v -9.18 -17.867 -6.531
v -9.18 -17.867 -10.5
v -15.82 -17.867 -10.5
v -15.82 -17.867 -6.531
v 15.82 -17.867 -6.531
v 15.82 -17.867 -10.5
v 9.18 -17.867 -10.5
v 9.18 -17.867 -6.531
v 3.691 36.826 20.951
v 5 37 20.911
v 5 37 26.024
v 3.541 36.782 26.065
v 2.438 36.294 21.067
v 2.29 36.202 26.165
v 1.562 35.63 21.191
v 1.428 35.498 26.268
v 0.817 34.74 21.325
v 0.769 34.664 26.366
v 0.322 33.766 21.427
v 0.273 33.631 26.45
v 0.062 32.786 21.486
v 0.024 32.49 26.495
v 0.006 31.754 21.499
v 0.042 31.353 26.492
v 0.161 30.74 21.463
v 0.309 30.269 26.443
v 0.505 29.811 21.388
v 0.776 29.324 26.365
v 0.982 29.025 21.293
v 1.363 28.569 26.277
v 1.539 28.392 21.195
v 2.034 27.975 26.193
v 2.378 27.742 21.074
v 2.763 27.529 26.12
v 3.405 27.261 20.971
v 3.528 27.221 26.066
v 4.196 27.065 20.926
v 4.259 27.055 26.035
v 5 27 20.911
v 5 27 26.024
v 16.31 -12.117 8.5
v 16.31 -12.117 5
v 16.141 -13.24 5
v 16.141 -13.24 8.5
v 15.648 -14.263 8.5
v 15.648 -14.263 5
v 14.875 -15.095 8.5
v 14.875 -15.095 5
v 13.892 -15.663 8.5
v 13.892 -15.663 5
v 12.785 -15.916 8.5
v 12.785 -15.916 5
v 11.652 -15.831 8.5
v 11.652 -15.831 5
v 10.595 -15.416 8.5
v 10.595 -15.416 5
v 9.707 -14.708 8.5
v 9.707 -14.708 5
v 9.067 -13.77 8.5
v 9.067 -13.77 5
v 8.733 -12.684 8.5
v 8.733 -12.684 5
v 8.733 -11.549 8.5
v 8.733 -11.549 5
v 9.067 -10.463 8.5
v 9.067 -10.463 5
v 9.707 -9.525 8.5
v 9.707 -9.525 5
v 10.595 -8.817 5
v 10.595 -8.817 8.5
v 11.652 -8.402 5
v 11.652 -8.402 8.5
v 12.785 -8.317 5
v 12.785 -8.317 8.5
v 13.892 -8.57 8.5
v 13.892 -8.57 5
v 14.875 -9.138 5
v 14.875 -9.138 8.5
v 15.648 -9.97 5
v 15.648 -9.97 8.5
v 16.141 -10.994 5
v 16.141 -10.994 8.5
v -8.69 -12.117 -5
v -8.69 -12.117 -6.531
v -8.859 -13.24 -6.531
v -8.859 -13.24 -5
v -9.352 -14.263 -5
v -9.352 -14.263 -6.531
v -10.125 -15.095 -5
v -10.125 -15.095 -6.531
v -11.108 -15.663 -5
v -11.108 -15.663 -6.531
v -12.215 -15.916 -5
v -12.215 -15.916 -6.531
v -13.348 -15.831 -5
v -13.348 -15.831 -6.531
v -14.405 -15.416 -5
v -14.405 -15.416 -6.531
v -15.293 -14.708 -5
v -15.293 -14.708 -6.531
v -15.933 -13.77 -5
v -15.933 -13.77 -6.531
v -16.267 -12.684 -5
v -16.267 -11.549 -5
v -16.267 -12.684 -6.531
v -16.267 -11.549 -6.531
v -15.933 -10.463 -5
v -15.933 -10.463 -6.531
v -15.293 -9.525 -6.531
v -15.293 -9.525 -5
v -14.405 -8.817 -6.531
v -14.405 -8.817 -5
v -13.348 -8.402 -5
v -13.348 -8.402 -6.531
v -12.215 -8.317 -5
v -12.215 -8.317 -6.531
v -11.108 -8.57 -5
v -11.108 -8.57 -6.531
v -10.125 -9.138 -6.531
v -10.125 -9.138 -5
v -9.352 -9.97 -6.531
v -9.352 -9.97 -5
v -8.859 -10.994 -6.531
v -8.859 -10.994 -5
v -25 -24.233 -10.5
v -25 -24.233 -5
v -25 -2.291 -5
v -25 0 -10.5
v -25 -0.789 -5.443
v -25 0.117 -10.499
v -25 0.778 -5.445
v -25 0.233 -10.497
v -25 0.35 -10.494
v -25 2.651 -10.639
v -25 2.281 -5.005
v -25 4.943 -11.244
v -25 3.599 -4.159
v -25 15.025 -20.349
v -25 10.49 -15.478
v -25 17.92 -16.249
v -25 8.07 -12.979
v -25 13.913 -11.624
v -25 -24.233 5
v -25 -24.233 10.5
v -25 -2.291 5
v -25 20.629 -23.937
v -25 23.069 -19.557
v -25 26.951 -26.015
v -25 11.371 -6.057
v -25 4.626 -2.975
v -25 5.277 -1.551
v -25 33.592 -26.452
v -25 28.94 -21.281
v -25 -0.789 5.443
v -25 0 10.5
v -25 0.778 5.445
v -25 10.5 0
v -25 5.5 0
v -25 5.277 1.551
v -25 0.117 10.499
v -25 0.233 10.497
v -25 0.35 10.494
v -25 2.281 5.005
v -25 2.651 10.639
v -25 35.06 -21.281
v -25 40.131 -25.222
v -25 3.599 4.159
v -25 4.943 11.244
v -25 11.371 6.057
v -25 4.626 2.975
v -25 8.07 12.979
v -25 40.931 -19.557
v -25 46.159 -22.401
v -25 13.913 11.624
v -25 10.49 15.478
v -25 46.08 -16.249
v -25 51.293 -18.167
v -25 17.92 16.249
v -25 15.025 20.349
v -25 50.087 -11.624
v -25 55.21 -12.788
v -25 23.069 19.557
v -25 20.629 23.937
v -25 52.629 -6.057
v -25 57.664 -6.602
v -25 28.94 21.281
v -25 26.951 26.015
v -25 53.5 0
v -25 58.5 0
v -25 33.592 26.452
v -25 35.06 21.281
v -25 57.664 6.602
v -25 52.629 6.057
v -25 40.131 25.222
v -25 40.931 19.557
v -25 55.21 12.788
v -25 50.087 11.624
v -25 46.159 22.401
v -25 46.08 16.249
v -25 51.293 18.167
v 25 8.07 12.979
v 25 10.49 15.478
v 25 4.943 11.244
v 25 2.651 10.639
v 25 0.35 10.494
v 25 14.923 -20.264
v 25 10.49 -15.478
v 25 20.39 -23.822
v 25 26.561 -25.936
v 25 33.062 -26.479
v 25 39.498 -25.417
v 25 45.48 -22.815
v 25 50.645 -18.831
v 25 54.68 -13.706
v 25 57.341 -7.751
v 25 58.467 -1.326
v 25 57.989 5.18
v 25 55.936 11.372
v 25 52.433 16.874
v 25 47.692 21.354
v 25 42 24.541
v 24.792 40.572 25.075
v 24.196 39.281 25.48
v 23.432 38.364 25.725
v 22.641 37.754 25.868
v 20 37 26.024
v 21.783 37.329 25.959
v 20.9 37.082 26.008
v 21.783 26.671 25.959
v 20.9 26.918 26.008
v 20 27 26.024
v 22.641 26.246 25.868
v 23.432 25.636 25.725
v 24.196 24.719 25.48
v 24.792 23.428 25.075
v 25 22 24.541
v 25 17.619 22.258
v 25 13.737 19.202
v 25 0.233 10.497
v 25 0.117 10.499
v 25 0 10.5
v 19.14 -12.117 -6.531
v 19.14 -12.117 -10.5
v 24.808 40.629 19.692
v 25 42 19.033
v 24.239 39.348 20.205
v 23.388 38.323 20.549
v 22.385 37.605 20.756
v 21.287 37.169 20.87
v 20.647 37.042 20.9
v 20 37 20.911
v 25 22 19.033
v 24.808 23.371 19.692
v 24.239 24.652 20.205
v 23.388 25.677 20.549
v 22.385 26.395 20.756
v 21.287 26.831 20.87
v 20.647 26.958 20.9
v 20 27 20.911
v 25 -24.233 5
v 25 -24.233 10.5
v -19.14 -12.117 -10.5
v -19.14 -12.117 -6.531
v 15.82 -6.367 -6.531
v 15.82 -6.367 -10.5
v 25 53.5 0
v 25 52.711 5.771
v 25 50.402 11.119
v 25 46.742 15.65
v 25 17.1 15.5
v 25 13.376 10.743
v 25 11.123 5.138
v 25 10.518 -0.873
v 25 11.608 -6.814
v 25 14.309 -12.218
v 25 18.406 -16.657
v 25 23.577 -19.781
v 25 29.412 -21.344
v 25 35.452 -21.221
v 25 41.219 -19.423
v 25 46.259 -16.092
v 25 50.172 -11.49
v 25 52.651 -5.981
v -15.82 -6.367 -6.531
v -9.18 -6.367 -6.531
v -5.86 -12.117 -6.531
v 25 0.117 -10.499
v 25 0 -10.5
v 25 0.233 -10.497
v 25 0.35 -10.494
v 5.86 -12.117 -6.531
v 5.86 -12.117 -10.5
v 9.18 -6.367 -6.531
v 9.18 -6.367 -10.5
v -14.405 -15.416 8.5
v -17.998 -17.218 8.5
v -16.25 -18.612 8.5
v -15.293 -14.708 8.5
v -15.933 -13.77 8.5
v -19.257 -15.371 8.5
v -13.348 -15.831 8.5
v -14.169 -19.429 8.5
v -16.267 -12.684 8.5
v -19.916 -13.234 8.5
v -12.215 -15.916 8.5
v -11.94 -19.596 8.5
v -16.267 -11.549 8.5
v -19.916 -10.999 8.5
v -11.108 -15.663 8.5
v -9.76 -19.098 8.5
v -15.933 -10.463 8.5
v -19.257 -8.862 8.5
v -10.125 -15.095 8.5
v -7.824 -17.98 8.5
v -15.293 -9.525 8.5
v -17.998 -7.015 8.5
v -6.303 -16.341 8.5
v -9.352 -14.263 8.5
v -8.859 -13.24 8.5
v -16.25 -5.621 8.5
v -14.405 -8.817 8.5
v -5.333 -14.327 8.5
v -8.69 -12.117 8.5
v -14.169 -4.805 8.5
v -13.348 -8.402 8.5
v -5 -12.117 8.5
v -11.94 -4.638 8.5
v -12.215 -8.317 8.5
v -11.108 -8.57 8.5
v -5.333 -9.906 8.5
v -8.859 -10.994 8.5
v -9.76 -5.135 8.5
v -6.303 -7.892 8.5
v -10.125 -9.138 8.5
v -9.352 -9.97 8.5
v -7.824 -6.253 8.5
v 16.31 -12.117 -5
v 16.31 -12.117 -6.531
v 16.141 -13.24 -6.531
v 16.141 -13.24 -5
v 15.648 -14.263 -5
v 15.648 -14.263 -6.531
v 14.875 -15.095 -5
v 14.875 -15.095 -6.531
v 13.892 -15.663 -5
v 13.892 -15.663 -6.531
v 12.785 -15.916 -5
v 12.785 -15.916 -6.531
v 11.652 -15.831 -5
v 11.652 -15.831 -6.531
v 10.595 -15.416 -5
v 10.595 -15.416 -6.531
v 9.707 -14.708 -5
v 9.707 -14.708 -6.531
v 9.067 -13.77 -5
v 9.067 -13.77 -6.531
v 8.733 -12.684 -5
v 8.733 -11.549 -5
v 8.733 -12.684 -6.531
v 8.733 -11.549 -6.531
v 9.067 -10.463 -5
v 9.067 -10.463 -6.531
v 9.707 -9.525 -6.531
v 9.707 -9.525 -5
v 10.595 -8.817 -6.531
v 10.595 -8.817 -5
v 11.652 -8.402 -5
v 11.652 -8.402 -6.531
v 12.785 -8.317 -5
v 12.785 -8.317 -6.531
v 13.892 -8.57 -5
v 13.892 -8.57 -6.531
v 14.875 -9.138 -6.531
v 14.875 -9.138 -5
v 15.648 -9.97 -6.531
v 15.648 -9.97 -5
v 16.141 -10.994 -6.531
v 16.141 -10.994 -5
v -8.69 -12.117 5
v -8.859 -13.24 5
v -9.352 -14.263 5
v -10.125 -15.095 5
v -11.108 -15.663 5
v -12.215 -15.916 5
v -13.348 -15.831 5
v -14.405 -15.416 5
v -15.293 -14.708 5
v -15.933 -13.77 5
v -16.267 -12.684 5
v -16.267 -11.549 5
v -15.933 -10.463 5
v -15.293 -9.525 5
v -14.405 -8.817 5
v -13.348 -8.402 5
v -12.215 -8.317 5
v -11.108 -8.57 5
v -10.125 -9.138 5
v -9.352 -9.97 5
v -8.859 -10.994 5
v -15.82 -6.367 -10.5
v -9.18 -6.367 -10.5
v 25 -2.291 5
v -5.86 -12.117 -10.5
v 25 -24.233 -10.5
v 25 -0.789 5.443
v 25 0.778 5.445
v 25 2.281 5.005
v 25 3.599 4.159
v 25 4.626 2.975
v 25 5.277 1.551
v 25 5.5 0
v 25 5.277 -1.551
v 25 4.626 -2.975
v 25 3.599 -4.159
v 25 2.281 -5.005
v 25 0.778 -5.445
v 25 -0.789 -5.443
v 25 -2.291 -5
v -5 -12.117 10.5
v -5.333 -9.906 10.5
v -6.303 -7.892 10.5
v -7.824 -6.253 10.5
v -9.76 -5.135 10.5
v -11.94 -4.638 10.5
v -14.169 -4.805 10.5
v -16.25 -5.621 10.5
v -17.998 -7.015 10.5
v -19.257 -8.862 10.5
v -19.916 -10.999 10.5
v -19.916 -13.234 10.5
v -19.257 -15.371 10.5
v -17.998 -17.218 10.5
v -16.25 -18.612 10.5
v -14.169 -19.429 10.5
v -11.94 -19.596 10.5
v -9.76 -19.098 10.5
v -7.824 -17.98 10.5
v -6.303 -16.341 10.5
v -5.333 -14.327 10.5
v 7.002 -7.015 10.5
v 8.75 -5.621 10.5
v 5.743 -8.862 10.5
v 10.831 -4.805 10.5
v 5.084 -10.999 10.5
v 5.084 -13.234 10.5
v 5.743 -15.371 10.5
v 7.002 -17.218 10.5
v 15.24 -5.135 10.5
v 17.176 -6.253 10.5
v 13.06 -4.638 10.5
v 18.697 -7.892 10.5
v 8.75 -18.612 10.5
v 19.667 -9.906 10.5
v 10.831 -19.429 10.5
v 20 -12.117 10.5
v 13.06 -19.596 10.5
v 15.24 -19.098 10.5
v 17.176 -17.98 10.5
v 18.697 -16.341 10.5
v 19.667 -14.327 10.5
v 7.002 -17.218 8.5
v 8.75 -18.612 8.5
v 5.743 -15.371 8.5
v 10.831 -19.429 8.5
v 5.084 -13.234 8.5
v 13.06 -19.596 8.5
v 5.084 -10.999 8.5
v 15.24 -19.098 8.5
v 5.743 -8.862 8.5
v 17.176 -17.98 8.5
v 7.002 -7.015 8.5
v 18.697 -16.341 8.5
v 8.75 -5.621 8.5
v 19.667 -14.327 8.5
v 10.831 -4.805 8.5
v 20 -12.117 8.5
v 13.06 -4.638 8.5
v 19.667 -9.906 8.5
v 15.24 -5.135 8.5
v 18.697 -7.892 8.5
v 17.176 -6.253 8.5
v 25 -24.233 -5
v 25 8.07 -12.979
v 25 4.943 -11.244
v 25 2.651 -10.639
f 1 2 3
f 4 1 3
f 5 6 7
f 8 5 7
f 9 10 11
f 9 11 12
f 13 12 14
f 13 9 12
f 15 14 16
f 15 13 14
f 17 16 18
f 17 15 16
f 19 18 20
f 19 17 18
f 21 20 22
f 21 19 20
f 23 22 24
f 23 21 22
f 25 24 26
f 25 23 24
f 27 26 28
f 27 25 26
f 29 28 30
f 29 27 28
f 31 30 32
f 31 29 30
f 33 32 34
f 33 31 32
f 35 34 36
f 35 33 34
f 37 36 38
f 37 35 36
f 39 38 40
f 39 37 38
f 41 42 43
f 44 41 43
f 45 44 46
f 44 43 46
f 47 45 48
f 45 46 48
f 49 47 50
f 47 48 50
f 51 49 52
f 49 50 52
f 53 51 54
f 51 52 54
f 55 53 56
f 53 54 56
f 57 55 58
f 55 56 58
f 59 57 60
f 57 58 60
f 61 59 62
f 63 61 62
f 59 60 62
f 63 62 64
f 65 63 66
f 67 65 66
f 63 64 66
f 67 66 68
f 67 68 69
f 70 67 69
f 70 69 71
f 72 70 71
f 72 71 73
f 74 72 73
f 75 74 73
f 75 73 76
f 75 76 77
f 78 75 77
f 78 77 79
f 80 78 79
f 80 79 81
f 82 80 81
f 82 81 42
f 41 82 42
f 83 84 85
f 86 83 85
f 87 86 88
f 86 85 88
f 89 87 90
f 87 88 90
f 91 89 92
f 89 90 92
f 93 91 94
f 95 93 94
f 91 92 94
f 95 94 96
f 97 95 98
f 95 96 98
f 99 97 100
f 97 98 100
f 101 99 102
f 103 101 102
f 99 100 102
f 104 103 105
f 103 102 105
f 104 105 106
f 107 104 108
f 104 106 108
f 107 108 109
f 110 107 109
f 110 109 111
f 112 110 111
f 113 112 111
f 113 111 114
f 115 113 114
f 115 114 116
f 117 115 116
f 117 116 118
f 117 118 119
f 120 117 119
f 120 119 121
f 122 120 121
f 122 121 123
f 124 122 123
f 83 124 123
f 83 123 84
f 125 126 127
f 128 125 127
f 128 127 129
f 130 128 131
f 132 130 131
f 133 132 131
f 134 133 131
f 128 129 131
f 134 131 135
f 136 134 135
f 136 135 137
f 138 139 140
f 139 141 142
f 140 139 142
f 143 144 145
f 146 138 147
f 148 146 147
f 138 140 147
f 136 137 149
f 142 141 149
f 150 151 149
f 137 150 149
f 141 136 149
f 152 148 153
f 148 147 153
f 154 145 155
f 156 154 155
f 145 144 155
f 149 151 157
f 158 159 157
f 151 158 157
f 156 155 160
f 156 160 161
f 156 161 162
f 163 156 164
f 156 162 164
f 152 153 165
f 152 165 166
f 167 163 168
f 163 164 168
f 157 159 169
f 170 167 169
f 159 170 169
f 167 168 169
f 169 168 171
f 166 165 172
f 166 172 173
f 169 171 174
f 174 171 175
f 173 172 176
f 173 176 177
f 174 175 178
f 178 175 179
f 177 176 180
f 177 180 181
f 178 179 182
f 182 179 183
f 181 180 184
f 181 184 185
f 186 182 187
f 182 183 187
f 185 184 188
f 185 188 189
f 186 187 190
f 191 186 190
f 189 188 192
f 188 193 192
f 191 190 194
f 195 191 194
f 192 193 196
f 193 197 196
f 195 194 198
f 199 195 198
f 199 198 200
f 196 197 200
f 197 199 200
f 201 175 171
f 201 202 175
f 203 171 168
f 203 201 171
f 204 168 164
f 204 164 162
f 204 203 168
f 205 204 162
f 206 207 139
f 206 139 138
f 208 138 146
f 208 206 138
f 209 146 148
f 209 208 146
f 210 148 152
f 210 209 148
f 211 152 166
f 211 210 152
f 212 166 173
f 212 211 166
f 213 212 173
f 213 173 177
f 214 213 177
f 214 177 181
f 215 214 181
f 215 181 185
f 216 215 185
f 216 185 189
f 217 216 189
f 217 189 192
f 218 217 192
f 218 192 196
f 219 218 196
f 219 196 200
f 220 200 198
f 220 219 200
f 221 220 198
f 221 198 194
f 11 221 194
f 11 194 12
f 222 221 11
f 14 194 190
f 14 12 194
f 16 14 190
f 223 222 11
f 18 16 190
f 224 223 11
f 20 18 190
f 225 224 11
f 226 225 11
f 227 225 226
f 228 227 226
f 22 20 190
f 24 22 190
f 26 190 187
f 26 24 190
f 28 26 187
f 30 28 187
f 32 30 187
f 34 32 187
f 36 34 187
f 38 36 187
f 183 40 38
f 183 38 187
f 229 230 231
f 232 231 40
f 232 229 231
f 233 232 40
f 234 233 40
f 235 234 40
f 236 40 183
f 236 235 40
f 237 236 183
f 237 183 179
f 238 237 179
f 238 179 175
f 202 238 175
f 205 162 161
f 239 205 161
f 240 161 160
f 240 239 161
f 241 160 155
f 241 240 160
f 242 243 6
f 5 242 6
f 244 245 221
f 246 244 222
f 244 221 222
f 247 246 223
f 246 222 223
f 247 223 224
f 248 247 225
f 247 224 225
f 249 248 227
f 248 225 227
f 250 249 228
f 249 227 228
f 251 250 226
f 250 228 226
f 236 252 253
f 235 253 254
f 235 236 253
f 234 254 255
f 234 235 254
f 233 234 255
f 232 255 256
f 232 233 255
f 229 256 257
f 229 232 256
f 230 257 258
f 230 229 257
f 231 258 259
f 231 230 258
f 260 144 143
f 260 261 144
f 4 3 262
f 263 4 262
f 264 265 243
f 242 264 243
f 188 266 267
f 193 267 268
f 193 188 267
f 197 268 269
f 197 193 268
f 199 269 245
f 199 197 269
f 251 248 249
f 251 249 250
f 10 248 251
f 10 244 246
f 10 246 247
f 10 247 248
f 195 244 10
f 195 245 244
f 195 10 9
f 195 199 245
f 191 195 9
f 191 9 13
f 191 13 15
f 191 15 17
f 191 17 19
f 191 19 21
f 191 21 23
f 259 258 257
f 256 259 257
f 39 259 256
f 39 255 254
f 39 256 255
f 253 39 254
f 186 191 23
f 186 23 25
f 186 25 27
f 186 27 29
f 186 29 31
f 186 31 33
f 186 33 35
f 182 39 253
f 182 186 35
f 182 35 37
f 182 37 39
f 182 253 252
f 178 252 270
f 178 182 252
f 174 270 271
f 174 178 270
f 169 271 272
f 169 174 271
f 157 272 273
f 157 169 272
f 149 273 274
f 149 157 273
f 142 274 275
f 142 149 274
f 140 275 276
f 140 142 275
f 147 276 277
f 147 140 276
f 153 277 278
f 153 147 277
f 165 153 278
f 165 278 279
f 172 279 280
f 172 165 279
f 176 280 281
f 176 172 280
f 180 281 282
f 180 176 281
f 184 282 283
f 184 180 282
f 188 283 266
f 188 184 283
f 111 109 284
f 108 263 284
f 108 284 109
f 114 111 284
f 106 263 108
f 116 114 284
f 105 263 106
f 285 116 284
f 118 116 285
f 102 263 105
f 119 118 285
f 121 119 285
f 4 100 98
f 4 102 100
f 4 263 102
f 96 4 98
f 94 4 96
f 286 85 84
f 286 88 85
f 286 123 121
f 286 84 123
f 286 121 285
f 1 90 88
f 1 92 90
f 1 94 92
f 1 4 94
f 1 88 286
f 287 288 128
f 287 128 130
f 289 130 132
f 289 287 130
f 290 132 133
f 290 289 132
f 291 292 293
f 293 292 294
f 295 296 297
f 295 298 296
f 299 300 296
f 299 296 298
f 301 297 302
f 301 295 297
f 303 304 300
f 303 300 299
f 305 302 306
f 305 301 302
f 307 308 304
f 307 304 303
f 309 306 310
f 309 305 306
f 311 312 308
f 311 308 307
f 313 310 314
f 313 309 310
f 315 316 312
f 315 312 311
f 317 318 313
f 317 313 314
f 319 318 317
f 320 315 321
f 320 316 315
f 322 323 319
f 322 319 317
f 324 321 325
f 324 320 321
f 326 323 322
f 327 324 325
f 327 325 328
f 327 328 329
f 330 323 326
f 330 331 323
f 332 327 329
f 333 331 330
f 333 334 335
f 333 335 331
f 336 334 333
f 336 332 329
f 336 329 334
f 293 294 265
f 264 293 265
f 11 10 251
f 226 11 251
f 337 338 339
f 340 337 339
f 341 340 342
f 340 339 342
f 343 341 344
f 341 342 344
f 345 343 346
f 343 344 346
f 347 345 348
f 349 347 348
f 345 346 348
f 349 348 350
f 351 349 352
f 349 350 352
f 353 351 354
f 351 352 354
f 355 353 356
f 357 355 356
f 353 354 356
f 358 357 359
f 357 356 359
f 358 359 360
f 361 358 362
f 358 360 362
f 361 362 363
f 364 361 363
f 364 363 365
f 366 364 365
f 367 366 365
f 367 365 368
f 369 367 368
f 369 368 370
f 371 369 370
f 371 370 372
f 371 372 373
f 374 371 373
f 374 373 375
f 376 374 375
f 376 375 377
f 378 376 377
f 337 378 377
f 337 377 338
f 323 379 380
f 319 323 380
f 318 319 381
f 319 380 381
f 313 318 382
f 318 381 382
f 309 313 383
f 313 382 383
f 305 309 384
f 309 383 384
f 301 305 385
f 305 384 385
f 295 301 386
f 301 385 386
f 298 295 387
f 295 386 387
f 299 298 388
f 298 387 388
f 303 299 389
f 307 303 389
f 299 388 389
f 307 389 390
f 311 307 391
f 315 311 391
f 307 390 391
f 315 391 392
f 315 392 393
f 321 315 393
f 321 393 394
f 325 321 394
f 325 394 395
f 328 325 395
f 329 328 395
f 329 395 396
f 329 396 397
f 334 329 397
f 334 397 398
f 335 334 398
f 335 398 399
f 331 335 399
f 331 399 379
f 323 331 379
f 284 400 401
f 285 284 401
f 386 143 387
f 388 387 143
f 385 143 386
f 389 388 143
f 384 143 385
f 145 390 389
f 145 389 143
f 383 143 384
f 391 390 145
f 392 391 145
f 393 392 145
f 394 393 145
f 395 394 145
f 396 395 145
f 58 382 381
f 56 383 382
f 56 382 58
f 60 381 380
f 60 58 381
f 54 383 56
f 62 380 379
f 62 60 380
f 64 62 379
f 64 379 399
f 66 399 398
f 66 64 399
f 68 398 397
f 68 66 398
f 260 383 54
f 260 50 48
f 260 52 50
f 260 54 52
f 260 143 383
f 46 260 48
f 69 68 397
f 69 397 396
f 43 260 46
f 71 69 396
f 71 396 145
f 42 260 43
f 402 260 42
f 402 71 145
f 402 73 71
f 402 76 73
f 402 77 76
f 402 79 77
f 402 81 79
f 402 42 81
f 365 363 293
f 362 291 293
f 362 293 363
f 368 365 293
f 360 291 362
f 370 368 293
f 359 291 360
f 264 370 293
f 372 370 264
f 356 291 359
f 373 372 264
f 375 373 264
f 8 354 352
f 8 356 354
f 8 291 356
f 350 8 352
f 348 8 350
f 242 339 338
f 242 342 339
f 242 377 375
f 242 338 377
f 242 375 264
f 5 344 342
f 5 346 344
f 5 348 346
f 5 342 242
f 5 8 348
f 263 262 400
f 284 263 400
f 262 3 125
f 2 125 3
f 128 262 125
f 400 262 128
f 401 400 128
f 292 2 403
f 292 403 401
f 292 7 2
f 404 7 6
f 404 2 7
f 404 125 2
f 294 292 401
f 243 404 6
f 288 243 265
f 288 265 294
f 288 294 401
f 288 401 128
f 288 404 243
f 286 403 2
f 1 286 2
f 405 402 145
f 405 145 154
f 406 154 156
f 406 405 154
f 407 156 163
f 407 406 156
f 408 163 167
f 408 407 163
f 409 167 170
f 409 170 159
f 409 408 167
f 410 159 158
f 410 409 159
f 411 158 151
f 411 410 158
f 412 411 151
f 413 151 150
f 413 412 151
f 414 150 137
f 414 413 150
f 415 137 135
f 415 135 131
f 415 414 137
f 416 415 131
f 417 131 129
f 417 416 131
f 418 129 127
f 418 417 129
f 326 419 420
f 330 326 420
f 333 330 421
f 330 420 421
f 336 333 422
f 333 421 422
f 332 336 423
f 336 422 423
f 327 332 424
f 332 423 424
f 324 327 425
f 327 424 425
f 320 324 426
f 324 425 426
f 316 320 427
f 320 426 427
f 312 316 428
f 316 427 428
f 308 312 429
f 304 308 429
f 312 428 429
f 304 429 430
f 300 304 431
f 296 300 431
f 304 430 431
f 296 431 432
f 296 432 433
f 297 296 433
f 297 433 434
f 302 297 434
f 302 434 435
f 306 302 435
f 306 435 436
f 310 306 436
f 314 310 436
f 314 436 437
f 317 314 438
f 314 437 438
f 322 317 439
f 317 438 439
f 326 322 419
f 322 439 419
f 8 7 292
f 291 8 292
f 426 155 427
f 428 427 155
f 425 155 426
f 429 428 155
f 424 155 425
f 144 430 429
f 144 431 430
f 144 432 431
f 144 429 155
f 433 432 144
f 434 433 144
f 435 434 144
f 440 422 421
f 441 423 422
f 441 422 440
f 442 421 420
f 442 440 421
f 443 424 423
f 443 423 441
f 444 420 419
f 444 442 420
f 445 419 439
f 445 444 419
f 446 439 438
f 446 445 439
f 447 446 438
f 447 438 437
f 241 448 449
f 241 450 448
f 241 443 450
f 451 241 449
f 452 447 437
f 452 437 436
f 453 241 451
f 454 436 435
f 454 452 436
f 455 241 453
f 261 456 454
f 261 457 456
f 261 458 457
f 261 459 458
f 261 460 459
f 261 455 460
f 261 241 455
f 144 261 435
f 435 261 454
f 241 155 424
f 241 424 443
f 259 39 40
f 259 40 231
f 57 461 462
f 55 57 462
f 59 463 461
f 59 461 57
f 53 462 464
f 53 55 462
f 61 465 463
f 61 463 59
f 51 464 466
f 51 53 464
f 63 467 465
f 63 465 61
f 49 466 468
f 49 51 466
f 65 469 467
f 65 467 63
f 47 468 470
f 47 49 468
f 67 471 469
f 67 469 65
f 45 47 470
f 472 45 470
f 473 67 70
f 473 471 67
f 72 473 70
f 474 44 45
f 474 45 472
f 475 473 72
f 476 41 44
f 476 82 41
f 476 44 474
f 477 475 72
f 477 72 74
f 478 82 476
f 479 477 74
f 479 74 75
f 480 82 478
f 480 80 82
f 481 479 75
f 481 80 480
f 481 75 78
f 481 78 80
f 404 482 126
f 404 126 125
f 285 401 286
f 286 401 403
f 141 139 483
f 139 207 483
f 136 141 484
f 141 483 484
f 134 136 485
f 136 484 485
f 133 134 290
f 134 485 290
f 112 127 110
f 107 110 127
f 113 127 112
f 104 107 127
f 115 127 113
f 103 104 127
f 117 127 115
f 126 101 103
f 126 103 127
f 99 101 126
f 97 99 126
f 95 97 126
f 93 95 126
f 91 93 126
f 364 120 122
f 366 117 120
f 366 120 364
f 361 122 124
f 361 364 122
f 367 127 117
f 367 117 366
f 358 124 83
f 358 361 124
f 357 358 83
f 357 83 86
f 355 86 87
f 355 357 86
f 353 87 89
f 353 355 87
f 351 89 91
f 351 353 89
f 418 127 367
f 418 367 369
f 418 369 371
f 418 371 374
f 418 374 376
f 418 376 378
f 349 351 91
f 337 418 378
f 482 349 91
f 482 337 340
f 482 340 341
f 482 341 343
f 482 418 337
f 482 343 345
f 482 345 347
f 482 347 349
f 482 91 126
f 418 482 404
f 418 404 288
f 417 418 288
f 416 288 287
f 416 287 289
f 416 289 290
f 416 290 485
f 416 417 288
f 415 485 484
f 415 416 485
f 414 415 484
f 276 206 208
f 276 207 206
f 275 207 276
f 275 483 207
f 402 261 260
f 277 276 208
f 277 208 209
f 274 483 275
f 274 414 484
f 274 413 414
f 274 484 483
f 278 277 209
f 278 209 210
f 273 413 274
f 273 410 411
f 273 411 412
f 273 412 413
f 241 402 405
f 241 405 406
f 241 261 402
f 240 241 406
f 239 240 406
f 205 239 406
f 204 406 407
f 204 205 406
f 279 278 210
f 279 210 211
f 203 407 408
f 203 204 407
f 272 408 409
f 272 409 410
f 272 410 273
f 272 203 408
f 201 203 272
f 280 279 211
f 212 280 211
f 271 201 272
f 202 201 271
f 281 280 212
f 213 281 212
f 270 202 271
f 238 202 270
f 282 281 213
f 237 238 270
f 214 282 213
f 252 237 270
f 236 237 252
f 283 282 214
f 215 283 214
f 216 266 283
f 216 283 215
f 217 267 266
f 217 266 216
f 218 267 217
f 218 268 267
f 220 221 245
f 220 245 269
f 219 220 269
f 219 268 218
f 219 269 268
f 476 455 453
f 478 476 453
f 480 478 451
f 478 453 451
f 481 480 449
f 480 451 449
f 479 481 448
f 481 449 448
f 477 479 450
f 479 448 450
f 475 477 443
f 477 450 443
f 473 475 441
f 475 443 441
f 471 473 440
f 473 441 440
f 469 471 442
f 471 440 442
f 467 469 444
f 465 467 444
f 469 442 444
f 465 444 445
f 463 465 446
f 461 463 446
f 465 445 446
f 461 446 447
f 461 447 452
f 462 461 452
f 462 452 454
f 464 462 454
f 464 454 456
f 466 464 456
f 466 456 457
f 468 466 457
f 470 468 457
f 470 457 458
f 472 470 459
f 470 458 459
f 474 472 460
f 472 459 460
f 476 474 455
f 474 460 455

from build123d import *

# Parameters (mm, degrees)
F1_DEPTH  = 25
F3_DEPTH  = 3.96875
F4_R      = 3.81
F5_DEPTH  = 21.001
F6_R      = 7.5
F7_DEPTH  = 2
F8_R      = 26.5
F8_R_2    = 21.5
F9_DEPTH  = 25
F10_W     = 41.7897145033
F10_H     = 10
F11_DEPTH = 26.501
F12_R     = 5
F13_R     = 12


# Not quite as in the source:
# - a length typed as a fraction of an inch, garbled in the dataset ("3 / 203.2 mm" for 3/8 in), is restored


with BuildPart() as f1:
    # F0 (on Right) → F1 (new body, symmetric)
    with BuildSketch(Plane.YZ):
        with BuildLine():
            Line((-24.2330926563, 5), (-9.2330926563, 5))
            ThreePointArc((-9.2330926563, 5), (-5.3735463151, 9.0208092763), (0, 10.5))
            Line((0, 10.5), (-24.2330926563, 10.5))
            Line((-24.2330926563, 10.5), (-24.2330926563, 5))
        make_face()
        with BuildLine():
            ThreePointArc((-2.2912878475, 5), (2.9705148408, 4.628827236), (5.5, 0))
            ThreePointArc((5.5, 0), (2.9705148408, -4.628827236), (-2.2912878475, -5))
            Line((-2.2912878475, -5), (-9.2330926563, -5))
            ThreePointArc((-9.2330926563, -5), (-5.3735463151, -9.0208092763), (0, -10.5))
            ThreePointArc((0, -10.5), (7.4246212025, -7.4246212025), (10.5, 0))
            ThreePointArc((10.5, 0), (7.4246212025, 7.4246212025), (0, 10.5))
            ThreePointArc((0, 10.5), (-5.3735463151, 9.0208092763), (-9.2330926563, 5))
            Line((-9.2330926563, 5), (-2.2912878475, 5))
        make_face()
        with BuildLine():
            ThreePointArc((0, -10.5), (-5.3735463151, -9.0208092763), (-9.2330926563, -5))
            Line((-9.2330926563, -5), (-24.2330926563, -5))
            Line((-24.2330926563, -5), (-24.2330926563, -10.5))
            Line((-24.2330926563, -10.5), (0, -10.5))
        make_face()
    extrude(amount=F1_DEPTH, both=True)

    # F2 (on face) → F3 (cut)
    with BuildSketch(Plane(origin=(0, 0, -10.5), x_dir=(1, 0, 0), z_dir=(0, 0, -1))):
        Polygon((19.1395280957, 12.1165463282), (15.8197640478, 17.8665463282), (9.1802359522, 17.8665463282), (5.8604719043, 12.1165463282), (9.1802359522, 6.3665463282), (15.8197640478, 6.3665463282), align=None)
        Polygon((-15.8197640478, 6.3665463282), (-9.1802359522, 6.3665463282), (-5.8604719043, 12.1165463282), (-9.1802359522, 17.8665463282), (-15.8197640478, 17.8665463282), (-19.1395280957, 12.1165463282), align=None)
    extrude(amount=-F3_DEPTH, mode=Mode.SUBTRACT)

    # F4 (on face) → F5 (cut, through all)
    with BuildSketch(Plane(origin=(0, 0, -10.5), x_dir=(1, 0, 0), z_dir=(0, 0, -1))):
        with Locations((12.5, 12.1165463282)):
            Circle(F4_R)
        with Locations((-12.5, 12.1165463282)):
            Circle(F4_R)
    extrude(amount=-F5_DEPTH, mode=Mode.SUBTRACT)

    # F6 (on face) → F7 (cut)
    with BuildSketch(Plane.XY.offset(10.5)):
        with Locations((-12.5, -12.1165463282)):
            Circle(F6_R)
        with Locations((12.5, -12.1165463282)):
            Circle(F6_R)
    extrude(amount=-F7_DEPTH, mode=Mode.SUBTRACT)

    # F8 (on Right) → F9 (join, symmetric)
    with BuildSketch(Plane.YZ):
        with Locations((32, 0)):
            Circle(F8_R)
        with Locations((32, 0)):
            Circle(F8_R_2, mode=Mode.SUBTRACT)
    extrude(amount=F9_DEPTH, both=True)

    # F10 (on Top) → F11 (cut, through all)
    with BuildSketch(Plane.XY):
        with Locations((25.8948572517, 32)):
            Rectangle(F10_W, F10_H)
        with BuildLine():
            ThreePointArc((5, 37), (0, 32), (5, 27))
            Line((5, 27), (5, 37))
        make_face()
    extrude(amount=F11_DEPTH, mode=Mode.SUBTRACT)

    # F12
    f12_edges = [f1.edges().sort_by_distance(p)[0] for p in [
        (25, 27, 23.467276),
        (25, 37, 23.467276),
    ]]
    fillet(f12_edges, radius=F12_R)

    # F13
    f13_edges = [f1.edges().sort_by_distance(p)[0] for p in [
        (0, 6.75, 8.042854),
        (0, 6.75, -8.042854),
    ]]
    fillet(f13_edges, radius=F13_R)


solid = f1.part
